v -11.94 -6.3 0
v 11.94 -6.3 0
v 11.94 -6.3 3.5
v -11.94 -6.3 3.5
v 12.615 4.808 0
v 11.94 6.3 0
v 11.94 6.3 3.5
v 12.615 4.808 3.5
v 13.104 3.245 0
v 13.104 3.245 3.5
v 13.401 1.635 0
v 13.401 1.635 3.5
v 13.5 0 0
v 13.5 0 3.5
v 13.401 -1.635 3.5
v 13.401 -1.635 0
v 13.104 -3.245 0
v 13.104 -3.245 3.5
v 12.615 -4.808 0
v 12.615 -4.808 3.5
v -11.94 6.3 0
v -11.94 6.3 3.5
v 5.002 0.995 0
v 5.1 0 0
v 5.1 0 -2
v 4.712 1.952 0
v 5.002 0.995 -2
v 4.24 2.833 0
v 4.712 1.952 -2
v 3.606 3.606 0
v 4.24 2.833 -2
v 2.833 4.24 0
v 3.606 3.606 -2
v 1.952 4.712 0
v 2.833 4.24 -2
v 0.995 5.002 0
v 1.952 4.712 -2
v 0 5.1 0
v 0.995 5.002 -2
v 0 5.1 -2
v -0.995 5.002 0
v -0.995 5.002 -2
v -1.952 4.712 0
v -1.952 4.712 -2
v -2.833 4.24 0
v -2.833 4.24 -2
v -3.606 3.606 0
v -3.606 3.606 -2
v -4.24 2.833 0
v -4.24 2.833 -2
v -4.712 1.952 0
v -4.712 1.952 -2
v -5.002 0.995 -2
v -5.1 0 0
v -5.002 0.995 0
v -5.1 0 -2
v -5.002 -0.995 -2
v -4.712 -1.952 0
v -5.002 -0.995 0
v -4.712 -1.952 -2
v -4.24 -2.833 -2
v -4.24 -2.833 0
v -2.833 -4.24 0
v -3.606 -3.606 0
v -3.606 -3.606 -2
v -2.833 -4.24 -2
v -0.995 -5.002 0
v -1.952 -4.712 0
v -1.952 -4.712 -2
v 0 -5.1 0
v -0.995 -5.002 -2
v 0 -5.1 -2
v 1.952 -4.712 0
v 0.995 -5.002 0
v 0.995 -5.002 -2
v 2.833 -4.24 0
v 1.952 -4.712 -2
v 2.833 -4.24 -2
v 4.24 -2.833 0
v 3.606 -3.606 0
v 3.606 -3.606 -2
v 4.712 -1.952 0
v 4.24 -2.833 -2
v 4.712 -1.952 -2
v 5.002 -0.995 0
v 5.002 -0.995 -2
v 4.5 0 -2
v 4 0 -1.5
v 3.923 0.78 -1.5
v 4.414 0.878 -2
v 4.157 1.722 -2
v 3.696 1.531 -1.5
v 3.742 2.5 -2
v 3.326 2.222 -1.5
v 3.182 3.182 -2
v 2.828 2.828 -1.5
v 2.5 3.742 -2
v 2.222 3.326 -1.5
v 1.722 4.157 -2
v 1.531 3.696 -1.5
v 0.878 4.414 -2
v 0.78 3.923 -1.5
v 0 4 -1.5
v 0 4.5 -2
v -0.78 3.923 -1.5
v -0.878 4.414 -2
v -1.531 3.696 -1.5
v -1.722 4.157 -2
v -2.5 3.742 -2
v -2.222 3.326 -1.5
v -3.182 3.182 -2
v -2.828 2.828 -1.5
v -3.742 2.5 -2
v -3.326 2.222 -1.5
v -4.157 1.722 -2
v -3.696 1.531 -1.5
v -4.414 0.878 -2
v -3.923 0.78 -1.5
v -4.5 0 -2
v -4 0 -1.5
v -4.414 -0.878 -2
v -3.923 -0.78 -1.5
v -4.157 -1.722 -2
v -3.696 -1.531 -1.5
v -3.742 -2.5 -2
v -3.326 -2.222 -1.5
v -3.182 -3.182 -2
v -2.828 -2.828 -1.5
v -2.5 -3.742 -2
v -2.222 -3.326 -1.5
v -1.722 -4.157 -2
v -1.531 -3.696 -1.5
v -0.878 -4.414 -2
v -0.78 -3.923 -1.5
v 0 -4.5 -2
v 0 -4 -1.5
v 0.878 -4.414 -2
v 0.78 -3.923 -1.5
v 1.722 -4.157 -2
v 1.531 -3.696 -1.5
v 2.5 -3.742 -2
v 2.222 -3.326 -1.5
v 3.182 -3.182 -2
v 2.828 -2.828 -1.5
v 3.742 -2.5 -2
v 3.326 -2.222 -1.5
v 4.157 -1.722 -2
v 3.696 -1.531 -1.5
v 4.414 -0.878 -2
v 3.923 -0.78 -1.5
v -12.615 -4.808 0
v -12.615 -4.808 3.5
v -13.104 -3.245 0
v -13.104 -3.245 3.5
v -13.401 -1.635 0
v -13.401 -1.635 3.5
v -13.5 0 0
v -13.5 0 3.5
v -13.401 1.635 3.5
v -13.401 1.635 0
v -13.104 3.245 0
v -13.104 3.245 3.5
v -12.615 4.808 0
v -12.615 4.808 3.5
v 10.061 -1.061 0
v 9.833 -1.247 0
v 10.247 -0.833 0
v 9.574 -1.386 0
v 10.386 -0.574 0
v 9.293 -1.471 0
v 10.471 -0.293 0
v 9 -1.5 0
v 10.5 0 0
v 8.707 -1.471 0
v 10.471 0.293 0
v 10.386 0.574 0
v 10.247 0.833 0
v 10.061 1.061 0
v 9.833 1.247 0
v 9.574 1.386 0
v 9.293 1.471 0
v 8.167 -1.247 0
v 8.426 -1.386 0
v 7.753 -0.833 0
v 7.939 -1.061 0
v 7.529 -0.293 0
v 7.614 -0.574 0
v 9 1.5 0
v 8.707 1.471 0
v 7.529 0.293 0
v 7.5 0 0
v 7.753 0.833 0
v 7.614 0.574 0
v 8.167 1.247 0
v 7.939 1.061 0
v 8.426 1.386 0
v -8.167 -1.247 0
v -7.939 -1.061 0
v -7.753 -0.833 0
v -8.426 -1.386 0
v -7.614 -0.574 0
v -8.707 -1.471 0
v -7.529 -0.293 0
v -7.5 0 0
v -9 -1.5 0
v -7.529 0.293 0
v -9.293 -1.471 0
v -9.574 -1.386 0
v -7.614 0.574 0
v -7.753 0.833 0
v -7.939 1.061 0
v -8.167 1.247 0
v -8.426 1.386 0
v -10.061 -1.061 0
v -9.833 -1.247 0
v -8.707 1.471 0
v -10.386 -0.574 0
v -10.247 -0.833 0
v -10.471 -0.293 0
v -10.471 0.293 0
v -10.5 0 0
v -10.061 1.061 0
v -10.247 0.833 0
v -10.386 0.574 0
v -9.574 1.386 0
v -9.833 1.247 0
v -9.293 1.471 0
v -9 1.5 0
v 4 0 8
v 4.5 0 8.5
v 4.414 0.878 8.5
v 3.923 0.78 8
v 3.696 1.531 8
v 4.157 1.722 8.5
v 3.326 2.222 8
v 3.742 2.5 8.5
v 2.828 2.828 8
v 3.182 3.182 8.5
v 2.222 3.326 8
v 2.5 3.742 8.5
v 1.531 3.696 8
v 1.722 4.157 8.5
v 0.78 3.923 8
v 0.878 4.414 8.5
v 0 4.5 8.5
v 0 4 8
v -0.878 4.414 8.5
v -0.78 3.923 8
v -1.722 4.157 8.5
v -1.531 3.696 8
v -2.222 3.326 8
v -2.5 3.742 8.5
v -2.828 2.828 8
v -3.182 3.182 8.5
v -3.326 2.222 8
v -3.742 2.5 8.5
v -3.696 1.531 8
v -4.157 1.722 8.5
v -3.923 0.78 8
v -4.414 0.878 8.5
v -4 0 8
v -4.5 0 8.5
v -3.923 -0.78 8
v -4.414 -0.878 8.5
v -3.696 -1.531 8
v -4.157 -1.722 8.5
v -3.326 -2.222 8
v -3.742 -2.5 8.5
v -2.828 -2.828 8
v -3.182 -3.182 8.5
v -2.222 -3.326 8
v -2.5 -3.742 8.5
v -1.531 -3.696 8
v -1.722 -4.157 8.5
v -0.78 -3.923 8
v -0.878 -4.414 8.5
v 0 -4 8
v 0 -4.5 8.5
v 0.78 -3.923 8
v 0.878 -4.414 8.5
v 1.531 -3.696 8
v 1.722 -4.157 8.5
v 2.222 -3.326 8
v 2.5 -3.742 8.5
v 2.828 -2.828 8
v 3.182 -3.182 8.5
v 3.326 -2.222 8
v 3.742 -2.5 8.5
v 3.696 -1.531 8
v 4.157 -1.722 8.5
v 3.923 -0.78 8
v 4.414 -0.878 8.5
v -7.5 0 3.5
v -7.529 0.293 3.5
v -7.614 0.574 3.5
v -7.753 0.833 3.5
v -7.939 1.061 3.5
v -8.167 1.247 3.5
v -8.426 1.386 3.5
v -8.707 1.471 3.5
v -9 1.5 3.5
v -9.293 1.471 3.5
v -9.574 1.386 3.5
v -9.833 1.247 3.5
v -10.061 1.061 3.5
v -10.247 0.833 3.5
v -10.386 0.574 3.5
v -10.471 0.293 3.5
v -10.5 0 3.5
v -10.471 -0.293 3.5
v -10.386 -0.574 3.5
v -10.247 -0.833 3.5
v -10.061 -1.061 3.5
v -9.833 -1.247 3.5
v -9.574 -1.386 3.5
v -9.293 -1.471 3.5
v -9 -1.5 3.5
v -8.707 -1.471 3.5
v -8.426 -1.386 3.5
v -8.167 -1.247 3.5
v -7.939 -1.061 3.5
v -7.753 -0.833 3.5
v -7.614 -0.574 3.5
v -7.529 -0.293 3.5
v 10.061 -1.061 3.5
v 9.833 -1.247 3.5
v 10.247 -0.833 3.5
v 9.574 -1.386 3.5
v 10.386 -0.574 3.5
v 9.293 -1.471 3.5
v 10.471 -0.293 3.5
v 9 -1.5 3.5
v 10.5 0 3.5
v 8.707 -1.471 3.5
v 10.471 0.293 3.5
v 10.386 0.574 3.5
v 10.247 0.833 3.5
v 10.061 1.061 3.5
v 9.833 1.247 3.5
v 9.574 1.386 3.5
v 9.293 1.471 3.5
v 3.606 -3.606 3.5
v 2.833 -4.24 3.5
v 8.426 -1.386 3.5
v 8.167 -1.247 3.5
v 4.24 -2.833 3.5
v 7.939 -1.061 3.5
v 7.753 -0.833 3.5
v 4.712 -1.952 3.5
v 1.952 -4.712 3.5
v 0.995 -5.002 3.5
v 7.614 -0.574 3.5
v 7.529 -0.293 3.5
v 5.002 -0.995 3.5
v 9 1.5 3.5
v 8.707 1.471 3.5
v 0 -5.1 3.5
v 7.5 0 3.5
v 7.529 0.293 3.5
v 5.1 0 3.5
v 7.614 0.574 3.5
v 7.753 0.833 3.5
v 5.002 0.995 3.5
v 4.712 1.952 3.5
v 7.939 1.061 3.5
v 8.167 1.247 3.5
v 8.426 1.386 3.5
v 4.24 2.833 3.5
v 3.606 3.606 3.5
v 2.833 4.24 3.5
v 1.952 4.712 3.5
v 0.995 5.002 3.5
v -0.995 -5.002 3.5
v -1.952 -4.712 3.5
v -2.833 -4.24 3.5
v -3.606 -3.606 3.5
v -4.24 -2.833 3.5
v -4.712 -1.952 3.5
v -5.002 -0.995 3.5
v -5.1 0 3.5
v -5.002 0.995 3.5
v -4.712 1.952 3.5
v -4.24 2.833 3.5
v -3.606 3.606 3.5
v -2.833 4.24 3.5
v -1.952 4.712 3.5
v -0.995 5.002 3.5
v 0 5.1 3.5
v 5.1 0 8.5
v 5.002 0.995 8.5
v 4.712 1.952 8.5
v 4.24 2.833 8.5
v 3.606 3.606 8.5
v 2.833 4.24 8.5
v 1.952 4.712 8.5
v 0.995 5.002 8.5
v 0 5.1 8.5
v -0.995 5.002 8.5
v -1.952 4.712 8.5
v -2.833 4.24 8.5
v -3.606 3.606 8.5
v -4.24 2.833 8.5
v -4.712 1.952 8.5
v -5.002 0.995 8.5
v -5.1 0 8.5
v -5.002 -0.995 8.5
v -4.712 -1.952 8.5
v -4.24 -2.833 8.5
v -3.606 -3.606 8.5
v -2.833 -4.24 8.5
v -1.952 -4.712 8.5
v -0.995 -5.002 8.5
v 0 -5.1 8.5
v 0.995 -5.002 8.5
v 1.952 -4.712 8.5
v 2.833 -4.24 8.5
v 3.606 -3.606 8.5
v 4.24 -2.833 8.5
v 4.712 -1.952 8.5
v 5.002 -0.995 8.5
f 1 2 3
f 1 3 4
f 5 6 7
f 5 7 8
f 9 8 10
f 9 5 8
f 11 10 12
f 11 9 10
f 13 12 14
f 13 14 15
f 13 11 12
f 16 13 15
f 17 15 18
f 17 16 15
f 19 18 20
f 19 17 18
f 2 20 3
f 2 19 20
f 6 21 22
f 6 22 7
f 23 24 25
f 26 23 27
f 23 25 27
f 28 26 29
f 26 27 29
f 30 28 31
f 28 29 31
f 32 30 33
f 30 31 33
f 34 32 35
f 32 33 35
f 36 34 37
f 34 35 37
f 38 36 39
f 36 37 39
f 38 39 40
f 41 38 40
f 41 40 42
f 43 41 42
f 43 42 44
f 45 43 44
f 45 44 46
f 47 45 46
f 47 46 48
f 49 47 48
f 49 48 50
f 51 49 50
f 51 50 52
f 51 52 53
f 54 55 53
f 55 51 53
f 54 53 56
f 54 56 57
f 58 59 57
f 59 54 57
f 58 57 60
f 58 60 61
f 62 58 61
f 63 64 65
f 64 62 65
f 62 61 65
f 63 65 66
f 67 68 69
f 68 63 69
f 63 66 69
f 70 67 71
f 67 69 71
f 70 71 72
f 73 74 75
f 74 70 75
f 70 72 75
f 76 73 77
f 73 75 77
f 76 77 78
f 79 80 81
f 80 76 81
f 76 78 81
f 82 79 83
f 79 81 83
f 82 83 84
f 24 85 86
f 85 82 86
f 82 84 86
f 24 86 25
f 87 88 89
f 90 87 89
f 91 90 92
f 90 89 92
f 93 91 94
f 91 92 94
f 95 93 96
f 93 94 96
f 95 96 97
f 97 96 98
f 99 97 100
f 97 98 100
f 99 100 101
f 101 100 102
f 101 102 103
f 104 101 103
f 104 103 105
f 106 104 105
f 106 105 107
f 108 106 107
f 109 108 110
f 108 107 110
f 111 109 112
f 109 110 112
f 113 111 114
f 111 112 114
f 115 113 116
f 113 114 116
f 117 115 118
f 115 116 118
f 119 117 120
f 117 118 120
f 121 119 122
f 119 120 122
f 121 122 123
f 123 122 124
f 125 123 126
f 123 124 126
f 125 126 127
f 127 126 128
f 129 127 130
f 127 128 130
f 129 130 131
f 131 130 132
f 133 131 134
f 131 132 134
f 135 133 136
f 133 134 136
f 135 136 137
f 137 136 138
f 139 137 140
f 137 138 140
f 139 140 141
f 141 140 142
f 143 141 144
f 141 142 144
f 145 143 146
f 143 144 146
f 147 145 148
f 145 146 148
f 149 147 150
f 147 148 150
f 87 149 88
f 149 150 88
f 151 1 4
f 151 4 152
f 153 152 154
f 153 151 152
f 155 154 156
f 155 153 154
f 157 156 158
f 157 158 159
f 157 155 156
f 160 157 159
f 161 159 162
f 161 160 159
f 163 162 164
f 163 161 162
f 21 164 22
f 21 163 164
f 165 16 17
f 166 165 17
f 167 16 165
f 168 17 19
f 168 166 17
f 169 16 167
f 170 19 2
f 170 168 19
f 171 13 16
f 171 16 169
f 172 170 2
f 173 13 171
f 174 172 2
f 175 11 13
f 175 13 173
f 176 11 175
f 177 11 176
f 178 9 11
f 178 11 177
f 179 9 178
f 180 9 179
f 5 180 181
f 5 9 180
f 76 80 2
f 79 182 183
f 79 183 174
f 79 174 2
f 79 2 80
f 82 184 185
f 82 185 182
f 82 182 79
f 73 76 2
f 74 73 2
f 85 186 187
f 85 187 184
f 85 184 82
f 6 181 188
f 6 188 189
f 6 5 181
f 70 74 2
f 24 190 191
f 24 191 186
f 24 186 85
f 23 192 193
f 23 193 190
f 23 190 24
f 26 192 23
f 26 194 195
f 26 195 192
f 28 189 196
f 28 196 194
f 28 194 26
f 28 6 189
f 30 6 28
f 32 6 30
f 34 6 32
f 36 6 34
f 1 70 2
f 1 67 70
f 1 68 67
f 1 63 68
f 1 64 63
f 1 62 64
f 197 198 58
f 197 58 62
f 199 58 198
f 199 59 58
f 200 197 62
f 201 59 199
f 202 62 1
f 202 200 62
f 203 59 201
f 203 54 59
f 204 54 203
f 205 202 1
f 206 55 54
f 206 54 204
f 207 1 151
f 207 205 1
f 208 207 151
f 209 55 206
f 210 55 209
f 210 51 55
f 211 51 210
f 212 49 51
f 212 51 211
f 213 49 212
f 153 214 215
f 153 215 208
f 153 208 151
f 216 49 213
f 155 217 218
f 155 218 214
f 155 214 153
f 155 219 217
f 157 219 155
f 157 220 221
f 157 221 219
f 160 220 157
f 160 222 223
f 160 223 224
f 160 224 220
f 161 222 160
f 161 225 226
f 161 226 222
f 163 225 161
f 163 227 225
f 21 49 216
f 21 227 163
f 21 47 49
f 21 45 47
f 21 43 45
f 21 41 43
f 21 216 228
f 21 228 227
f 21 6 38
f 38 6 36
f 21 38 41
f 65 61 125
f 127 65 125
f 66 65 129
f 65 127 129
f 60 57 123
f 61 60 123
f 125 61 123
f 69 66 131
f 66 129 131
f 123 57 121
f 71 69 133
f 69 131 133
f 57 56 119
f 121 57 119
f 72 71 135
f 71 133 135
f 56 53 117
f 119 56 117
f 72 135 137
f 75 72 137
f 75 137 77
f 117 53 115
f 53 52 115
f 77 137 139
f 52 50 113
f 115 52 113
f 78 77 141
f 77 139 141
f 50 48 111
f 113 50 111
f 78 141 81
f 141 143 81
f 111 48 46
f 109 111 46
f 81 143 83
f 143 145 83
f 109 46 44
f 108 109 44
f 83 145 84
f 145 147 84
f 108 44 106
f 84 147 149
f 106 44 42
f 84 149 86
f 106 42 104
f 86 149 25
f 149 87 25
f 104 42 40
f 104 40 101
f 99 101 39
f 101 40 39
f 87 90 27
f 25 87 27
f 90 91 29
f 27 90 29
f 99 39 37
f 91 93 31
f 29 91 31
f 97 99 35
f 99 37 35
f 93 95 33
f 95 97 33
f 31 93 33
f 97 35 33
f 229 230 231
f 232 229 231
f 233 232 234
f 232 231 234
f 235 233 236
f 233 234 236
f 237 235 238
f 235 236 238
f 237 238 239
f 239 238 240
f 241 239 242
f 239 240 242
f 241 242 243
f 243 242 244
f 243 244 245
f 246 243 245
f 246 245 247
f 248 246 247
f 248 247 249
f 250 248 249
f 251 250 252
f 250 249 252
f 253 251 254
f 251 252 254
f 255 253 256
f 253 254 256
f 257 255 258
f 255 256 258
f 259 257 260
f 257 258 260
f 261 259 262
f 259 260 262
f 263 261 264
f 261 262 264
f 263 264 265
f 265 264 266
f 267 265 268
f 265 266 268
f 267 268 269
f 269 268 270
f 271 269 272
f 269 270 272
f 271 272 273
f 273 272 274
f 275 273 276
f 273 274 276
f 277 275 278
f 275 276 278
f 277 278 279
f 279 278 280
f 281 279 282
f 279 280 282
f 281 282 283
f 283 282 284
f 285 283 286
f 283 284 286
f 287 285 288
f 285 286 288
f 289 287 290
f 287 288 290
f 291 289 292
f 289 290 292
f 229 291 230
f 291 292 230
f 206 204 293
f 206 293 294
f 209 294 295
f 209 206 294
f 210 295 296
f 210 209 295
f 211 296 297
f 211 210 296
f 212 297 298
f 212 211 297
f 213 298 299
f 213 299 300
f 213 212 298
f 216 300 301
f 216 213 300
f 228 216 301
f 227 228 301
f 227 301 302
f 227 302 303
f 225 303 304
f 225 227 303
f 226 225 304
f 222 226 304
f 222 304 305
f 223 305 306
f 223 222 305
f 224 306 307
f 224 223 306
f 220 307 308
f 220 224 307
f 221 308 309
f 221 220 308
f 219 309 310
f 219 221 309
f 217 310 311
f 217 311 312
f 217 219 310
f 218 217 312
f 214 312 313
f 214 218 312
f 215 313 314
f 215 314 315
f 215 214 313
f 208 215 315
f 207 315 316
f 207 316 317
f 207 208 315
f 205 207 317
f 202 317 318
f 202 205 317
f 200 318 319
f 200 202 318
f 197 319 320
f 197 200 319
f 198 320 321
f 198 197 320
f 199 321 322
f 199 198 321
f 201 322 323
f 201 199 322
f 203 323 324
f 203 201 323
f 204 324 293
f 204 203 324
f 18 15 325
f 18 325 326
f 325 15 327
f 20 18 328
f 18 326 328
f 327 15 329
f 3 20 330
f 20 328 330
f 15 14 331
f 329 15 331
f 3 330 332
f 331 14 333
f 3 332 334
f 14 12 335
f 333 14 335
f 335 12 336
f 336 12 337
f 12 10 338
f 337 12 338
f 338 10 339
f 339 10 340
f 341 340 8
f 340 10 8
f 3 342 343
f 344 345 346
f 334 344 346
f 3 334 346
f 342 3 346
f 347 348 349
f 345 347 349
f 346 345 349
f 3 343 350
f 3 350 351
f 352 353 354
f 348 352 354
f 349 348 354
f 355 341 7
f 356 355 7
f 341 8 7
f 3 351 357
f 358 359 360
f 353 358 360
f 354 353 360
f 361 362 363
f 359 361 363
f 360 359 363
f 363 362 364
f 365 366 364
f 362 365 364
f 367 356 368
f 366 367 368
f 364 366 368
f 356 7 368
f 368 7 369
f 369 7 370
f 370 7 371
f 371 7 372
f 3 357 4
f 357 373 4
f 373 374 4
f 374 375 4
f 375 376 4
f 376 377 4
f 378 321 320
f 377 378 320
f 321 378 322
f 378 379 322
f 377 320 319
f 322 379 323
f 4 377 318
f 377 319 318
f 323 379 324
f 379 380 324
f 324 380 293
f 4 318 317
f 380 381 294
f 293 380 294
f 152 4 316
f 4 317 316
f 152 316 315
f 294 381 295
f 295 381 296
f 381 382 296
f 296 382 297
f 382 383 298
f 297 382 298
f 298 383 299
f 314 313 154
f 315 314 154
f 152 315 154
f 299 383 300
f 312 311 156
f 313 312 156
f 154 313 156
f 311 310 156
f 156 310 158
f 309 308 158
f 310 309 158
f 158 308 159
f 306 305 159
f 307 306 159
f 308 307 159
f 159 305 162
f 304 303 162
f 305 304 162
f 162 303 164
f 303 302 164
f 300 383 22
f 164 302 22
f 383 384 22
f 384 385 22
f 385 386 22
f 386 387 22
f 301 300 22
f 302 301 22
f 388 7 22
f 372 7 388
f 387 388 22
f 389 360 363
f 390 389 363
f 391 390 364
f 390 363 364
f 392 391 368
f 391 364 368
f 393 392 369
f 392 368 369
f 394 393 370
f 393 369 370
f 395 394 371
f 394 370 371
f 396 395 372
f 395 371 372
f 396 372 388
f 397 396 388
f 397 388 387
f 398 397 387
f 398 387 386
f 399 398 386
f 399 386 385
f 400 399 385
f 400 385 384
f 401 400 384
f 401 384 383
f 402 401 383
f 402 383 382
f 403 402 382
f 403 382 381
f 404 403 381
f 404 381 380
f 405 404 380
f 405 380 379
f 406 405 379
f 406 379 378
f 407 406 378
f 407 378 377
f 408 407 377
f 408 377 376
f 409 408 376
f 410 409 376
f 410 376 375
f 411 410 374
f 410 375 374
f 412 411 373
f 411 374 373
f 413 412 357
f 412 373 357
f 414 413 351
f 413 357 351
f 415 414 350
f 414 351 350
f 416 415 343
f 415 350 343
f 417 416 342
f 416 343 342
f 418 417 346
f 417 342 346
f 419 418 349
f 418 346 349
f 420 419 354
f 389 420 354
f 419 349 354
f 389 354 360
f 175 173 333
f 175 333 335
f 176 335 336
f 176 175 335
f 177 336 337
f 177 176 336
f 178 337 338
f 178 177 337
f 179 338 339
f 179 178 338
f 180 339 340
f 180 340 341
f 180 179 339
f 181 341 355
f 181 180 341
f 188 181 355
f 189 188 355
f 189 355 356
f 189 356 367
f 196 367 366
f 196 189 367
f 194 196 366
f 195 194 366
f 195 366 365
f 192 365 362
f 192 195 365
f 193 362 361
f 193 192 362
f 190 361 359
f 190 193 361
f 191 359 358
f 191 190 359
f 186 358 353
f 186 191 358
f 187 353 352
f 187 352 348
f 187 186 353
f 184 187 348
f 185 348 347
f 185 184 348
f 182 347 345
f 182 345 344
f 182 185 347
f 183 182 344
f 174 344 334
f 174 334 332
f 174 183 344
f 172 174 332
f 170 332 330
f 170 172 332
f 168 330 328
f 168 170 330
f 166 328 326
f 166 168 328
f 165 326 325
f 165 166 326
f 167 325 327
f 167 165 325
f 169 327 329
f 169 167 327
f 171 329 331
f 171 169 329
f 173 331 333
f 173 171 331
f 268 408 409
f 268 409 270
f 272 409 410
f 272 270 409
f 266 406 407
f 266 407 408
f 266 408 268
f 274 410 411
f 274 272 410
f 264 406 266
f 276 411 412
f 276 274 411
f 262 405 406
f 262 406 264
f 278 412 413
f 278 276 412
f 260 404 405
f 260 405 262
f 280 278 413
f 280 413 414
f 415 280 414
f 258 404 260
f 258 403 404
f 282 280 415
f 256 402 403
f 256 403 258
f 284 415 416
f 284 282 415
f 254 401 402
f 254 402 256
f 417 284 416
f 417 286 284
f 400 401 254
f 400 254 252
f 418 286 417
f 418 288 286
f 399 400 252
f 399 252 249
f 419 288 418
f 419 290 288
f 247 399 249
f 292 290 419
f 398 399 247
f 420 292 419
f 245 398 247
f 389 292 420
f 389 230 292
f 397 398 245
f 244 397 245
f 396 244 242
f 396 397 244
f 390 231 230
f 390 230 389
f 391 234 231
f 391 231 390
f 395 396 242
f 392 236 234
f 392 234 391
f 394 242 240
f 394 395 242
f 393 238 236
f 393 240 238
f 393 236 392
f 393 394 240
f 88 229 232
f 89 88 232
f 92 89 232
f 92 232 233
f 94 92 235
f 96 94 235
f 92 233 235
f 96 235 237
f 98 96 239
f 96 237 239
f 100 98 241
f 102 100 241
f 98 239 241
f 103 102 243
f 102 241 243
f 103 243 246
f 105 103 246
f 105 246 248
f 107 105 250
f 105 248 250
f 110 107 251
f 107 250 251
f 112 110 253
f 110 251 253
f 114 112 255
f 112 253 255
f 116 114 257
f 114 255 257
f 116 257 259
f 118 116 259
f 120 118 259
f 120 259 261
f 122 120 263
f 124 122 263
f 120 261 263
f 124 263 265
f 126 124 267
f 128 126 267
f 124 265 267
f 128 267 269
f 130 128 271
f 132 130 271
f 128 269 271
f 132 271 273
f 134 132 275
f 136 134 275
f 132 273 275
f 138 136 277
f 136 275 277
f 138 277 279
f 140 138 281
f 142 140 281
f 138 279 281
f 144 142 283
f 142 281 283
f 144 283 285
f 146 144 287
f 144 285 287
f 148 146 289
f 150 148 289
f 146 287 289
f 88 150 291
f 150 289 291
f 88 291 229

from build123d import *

# Parameters (mm, degrees)
SKICA1_R                     = 1.5
P_IDAT_VYSUNUT_M1_DEPTH      = 3.5
P_IDAT_VYSUNUT_M2_DEPTH      = 5
P_IDAT_VYSUNUT_M2_DEPTH_BACK = 5.5
SKICA2_R                     = 5.1
SKICA3_R                     = 4
ODEBRAT_VYSUNUT_M1_DEPTH     = 10.5
ZKOSEN_1_SIZE                = 0.5


with BuildPart() as part:
    # Skica1 → Přidat vysunutím1 (new body)
    with BuildSketch(Plane.XY):
        with BuildLine():
            Line((-11.939849245, 6.3), (11.939849245, 6.3))
            ThreePointArc((11.939849245, 6.3), (13.5, 0), (11.939849245, -6.3))
            Line((11.939849245, -6.3), (-11.939849245, -6.3))
            ThreePointArc((-11.939849245, -6.3), (-13.5, 0), (-11.939849245, 6.3))
        make_face()
        with Locations((-9, 0)):
            Circle(SKICA1_R, mode=Mode.SUBTRACT)
        with Locations((9, 0)):
            Circle(SKICA1_R, mode=Mode.SUBTRACT)
    extrude(amount=P_IDAT_VYSUNUT_M1_DEPTH)

    # Skica2 → Přidat vysunutím2 (add, two sides: drawn at the far end of the back side and taken through both)
    with BuildSketch(Plane.XY.offset(3.5).offset(-P_IDAT_VYSUNUT_M2_DEPTH_BACK)):
        Circle(SKICA2_R)
    extrude(amount=P_IDAT_VYSUNUT_M2_DEPTH + P_IDAT_VYSUNUT_M2_DEPTH_BACK)

    # Skica3 → Odebrat vysunutím1 (cut)
    with BuildSketch(Plane.XY.offset(8.5)):
        Circle(SKICA3_R)
    extrude(amount=-ODEBRAT_VYSUNUT_M1_DEPTH, mode=Mode.SUBTRACT)

    # Zkosení1
    zkosen_1_edges = [part.edges().sort_by_distance(p)[0] for p in [
        (-4, 0, 8.5),
        (-4, 0, -2),
    ]]
    chamfer(zkosen_1_edges, length=ZKOSEN_1_SIZE)


solid = part.part
